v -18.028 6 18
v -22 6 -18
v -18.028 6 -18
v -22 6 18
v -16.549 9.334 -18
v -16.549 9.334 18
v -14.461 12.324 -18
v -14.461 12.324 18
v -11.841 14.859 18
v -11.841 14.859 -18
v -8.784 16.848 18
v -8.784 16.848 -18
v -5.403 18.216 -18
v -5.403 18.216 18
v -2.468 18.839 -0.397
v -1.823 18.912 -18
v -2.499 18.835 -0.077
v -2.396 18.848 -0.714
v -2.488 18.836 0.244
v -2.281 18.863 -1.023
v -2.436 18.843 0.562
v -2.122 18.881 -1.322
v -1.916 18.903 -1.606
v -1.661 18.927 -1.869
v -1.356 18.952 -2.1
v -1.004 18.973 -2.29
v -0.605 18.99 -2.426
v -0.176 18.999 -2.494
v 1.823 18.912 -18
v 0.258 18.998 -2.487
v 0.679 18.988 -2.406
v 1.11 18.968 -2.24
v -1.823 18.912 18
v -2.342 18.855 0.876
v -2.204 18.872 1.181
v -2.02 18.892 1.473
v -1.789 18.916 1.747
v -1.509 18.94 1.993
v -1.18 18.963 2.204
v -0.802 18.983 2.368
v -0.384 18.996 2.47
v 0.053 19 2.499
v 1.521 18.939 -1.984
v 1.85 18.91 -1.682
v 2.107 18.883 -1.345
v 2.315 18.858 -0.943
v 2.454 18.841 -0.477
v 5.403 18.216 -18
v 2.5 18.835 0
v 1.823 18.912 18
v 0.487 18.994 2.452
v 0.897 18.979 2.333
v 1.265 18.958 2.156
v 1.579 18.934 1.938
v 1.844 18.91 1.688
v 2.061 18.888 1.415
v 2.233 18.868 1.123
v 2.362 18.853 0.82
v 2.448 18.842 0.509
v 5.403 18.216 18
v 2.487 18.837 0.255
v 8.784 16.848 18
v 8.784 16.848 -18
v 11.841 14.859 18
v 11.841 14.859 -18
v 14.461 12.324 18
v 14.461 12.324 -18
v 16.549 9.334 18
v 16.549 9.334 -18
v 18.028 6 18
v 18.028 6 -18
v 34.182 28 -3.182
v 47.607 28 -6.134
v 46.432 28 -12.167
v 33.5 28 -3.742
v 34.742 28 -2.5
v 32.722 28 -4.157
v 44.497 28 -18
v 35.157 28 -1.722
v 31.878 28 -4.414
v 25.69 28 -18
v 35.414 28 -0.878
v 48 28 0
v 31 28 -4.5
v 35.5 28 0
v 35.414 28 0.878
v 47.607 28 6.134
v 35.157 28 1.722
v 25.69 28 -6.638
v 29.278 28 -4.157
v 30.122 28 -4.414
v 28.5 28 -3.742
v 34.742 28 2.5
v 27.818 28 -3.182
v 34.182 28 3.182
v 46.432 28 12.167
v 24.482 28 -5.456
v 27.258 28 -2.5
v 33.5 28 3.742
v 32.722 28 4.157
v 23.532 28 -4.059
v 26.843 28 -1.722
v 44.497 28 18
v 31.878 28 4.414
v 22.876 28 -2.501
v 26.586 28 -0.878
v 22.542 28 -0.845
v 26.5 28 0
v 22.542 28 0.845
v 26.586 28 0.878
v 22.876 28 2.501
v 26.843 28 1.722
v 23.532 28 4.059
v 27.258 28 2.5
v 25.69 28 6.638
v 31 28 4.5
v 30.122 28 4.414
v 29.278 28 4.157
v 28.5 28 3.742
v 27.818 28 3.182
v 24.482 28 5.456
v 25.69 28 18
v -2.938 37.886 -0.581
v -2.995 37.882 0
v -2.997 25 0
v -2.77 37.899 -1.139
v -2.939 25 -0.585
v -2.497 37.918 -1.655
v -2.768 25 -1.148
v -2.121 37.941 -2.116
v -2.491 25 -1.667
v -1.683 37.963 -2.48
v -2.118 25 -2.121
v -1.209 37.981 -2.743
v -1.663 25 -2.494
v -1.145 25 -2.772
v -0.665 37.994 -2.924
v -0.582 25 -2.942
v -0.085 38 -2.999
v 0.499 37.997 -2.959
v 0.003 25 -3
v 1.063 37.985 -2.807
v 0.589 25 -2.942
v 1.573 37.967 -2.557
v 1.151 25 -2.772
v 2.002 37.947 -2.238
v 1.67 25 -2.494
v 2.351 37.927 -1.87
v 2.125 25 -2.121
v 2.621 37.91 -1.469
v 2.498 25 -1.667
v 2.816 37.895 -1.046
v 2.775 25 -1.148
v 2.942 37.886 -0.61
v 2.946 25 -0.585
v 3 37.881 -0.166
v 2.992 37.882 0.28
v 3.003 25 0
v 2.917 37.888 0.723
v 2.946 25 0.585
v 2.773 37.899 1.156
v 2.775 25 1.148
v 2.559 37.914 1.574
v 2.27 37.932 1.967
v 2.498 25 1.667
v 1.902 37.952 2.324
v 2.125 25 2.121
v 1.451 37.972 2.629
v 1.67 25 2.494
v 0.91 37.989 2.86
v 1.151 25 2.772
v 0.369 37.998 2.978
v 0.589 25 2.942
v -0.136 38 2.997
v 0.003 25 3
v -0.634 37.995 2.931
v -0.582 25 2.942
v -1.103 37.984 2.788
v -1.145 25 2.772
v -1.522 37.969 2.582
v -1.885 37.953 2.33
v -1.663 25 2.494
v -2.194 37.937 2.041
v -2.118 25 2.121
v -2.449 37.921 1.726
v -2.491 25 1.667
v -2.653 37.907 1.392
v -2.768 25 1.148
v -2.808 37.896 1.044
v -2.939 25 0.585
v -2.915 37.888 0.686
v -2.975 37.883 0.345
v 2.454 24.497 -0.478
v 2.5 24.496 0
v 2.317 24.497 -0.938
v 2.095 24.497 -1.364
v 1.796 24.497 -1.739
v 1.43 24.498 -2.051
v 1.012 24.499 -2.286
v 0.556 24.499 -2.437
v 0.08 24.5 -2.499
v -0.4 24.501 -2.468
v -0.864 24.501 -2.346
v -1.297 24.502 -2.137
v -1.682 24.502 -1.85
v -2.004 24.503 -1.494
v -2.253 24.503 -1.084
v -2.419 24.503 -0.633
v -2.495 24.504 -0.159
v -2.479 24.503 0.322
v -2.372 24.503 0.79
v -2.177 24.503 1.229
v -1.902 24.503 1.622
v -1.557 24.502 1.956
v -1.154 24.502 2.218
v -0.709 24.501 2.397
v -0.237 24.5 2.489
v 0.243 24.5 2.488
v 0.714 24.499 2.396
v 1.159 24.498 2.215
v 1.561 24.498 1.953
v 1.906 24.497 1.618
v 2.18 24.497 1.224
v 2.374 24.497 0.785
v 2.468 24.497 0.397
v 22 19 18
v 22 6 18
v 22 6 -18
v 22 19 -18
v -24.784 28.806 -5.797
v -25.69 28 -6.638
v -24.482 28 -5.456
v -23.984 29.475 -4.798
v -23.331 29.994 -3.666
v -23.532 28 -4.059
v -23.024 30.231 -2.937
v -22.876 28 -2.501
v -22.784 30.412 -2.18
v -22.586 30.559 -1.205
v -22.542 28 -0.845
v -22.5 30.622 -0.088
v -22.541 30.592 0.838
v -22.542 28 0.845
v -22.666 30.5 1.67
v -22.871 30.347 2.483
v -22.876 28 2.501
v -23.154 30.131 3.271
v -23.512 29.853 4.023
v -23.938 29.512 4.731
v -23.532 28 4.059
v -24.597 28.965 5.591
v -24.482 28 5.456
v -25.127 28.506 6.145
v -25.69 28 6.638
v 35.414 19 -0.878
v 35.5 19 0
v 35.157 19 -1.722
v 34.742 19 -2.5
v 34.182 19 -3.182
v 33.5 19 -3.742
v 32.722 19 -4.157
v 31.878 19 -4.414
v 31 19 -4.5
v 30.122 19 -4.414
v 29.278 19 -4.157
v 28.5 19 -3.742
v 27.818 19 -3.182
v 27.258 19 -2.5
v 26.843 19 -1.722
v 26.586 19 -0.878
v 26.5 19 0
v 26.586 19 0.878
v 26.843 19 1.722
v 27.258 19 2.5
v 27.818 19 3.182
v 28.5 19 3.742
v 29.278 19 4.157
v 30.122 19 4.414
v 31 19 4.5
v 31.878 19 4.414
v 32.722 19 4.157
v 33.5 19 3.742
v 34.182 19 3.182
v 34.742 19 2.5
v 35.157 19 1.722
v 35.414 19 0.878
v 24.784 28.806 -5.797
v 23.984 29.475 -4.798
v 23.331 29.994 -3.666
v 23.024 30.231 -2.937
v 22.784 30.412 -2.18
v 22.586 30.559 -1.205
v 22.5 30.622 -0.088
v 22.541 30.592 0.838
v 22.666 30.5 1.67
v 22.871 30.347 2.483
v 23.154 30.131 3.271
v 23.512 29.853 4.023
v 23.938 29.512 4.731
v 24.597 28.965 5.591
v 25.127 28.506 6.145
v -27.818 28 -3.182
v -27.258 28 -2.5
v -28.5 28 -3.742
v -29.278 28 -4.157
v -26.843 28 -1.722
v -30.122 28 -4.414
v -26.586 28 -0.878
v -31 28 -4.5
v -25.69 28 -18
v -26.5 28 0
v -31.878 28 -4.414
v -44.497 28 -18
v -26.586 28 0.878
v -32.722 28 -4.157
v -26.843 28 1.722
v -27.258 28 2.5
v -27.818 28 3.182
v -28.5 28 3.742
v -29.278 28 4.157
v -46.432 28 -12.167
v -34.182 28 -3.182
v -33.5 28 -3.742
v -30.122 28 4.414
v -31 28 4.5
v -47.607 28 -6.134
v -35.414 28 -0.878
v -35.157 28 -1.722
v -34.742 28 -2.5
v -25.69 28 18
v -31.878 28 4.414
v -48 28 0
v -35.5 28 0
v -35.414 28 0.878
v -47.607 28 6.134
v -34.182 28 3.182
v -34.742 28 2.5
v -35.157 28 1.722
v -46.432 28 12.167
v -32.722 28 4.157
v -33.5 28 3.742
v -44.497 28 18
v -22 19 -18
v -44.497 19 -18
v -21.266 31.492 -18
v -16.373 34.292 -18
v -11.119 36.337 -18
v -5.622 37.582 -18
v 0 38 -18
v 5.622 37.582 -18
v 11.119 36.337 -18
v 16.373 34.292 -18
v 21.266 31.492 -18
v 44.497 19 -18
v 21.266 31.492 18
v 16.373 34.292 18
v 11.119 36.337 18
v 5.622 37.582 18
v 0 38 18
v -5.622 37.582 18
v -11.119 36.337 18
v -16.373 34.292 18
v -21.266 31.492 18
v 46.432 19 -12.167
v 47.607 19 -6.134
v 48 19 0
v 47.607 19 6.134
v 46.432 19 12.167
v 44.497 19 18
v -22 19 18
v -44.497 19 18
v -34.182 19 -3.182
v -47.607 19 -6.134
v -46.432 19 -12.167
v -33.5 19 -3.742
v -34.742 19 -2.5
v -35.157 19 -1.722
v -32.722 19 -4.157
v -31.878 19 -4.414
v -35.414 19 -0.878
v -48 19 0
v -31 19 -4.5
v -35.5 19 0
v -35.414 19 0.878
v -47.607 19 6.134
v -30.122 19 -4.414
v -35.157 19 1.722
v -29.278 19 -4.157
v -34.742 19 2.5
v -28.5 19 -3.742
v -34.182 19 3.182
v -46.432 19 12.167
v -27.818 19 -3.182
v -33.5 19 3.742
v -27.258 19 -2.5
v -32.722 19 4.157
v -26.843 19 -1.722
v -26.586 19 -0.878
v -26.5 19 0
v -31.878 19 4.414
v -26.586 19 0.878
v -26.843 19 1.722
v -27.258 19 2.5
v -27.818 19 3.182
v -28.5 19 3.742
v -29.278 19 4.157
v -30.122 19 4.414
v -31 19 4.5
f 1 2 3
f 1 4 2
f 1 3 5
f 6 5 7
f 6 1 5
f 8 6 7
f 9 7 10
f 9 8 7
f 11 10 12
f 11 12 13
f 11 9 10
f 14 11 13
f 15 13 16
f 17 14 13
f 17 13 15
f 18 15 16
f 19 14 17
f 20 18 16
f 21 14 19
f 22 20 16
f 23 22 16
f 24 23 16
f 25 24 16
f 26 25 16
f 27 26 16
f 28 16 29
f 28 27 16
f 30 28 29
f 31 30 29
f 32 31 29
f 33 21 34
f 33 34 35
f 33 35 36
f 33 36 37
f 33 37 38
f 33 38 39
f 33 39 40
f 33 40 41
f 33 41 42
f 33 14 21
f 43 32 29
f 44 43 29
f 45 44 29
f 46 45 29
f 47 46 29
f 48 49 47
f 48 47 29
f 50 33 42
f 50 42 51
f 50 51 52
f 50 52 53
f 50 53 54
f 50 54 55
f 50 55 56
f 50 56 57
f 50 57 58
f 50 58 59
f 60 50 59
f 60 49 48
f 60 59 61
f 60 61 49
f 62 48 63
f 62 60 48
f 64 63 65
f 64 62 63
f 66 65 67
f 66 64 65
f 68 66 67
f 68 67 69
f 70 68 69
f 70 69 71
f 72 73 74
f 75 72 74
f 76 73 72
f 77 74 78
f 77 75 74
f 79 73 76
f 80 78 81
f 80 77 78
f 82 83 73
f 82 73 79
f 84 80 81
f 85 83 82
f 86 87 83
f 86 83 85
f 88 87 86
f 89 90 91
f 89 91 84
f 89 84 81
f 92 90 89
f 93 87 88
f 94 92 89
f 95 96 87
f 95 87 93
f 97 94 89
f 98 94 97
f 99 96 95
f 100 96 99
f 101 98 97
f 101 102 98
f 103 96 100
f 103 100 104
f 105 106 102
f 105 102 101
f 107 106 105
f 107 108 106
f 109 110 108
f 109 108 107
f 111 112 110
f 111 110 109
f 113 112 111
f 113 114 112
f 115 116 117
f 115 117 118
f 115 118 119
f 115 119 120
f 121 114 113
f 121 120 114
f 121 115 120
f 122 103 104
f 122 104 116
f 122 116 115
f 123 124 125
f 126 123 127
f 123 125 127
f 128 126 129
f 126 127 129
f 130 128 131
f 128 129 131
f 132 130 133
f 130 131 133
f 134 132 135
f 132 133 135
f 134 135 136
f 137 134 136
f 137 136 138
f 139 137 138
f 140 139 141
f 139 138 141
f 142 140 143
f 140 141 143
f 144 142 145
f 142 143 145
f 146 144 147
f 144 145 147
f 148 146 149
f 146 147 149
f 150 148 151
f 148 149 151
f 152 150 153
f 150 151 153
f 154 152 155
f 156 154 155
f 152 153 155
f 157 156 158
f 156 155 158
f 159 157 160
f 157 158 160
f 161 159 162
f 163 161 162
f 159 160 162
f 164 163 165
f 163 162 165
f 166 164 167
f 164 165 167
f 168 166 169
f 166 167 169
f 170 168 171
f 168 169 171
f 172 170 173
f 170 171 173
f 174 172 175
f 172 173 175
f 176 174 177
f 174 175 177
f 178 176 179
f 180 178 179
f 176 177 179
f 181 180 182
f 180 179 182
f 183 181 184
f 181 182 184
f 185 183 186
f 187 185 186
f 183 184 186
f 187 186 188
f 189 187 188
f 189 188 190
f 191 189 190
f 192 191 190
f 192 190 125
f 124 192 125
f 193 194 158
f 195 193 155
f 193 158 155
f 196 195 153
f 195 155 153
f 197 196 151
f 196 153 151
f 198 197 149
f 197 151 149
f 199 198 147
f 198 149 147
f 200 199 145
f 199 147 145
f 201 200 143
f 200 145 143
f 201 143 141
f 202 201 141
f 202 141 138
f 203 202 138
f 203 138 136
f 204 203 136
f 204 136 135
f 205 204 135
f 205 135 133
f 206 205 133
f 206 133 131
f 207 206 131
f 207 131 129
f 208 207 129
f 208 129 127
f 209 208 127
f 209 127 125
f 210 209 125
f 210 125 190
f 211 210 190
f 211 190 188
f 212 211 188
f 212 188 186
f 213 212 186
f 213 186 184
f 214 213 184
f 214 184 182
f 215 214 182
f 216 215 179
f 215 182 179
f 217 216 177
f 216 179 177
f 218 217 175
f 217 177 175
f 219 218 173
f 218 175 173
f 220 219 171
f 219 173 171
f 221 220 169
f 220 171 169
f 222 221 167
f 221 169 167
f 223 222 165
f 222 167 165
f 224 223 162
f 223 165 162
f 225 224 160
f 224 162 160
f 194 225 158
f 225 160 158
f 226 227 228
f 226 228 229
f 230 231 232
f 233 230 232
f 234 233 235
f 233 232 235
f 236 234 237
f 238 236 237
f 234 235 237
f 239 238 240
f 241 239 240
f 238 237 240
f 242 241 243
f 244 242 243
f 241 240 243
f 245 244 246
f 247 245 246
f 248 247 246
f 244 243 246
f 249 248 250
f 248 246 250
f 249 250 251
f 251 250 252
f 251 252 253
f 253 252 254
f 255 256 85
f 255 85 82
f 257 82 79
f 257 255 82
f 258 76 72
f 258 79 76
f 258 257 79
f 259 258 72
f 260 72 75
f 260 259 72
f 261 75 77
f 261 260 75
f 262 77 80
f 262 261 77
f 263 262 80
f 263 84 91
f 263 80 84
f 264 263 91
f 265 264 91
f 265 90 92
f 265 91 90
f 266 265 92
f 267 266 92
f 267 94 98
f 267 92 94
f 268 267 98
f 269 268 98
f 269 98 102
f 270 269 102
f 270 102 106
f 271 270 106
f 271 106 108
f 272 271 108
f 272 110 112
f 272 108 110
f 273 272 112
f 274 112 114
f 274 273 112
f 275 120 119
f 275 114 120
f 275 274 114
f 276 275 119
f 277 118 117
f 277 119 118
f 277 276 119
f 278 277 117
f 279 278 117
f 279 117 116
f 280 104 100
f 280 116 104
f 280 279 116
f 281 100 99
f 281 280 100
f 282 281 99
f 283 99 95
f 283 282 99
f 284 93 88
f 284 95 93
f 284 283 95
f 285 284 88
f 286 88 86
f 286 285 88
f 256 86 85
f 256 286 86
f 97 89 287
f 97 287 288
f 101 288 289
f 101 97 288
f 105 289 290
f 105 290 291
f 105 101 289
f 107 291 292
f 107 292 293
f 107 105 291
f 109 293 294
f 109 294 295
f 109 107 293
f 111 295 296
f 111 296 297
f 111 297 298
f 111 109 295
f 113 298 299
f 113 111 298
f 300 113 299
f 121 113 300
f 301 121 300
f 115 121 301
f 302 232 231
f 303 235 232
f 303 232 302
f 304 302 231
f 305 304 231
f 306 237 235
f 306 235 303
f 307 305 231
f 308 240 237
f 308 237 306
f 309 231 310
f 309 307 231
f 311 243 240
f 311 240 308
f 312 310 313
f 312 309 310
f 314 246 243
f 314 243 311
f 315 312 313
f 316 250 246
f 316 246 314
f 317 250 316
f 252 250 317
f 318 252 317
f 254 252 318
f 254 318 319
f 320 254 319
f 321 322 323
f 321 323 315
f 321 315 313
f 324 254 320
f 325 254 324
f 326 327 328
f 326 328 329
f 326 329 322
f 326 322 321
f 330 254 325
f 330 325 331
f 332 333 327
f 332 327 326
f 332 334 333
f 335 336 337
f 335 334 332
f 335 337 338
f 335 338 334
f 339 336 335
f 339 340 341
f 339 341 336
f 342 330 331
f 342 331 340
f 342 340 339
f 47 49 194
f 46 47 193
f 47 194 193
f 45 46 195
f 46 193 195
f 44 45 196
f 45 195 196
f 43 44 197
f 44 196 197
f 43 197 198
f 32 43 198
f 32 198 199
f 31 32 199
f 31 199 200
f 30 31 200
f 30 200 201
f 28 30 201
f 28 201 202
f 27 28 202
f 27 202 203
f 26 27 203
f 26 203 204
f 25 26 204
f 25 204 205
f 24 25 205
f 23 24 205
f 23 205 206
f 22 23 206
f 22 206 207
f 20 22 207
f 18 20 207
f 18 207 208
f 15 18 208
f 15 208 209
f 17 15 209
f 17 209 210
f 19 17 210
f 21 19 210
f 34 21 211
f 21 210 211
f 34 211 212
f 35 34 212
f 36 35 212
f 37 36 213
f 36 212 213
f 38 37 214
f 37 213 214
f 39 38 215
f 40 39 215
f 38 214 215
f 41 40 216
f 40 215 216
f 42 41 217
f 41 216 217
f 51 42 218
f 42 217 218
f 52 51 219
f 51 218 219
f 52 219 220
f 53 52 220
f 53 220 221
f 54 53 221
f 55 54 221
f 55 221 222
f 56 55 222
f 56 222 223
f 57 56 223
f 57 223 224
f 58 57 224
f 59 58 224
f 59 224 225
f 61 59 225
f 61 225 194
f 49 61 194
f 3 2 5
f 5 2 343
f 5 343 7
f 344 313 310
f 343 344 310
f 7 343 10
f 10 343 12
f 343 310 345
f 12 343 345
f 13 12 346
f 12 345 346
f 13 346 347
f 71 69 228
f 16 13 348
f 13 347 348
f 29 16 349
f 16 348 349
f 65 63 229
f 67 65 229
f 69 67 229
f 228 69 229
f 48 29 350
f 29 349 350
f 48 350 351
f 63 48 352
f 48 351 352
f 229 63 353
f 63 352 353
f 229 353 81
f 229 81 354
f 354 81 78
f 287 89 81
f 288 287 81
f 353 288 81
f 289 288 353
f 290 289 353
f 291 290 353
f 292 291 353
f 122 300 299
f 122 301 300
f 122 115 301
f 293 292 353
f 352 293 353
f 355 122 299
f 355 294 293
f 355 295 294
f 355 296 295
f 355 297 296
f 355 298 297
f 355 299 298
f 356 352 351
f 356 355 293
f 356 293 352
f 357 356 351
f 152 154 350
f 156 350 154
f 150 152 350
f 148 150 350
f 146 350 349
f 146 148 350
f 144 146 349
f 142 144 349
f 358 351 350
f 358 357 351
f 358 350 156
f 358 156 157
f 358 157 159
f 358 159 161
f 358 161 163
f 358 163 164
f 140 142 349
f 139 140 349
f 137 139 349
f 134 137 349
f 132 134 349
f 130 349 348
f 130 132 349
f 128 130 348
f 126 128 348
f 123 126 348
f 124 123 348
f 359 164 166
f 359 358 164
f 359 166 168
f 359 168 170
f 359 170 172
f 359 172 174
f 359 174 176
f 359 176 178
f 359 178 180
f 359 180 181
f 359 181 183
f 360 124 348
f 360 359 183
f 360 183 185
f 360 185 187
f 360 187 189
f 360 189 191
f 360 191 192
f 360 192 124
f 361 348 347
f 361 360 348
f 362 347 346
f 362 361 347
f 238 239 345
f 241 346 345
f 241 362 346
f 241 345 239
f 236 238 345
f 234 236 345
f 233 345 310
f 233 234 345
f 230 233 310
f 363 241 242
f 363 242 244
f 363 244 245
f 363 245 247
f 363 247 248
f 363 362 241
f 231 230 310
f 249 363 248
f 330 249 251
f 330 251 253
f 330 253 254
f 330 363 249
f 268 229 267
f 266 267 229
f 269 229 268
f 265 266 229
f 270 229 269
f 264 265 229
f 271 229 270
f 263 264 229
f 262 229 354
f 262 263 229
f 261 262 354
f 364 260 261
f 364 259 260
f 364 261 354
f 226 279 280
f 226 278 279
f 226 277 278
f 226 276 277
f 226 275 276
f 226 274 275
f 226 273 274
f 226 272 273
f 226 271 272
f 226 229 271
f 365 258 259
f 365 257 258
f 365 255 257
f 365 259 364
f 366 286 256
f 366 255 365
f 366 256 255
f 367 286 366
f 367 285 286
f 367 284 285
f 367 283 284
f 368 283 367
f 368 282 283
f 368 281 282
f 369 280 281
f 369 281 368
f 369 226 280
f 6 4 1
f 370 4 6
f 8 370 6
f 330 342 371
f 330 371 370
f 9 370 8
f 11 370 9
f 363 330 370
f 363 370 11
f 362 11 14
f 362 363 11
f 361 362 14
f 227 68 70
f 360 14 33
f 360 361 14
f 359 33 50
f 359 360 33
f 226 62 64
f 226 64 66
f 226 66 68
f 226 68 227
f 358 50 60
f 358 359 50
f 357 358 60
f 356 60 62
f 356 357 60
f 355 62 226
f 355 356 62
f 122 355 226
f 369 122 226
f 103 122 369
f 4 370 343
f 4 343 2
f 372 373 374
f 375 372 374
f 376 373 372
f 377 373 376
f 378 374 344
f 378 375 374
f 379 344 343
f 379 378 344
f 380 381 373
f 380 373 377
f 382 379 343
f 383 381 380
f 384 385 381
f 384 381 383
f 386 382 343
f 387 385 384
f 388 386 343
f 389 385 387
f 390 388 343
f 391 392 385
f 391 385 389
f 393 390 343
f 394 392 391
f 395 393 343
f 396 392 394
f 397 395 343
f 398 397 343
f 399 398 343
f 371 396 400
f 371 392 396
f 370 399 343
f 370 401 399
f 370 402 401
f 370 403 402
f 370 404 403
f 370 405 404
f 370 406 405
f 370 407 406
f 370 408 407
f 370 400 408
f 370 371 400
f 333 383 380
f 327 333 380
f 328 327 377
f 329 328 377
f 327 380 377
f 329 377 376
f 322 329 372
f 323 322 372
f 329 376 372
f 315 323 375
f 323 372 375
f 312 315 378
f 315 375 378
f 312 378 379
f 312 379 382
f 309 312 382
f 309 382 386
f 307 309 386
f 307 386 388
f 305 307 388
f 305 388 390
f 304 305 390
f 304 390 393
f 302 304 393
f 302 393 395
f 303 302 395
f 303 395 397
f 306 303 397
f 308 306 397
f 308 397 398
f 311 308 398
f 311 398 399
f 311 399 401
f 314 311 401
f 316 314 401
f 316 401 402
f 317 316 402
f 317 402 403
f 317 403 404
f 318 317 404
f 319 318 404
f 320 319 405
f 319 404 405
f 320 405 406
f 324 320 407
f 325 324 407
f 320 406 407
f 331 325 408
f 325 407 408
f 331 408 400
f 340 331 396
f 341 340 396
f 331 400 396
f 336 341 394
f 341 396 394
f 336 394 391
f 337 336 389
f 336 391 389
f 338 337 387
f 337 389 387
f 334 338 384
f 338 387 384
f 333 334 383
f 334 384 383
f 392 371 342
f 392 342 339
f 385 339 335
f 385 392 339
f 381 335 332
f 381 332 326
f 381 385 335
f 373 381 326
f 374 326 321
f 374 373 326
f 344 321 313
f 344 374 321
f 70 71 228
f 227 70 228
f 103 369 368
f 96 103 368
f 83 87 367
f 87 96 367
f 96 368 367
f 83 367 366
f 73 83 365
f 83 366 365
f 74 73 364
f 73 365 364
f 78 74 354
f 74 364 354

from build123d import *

# Parameters (mm, degrees)
BOSS_EXTRUDE1_DEPTH                 = 18
F_6_0MM_DOWEL_HOLE1_D               = 9
CUT_EXTRUDE2_DEPTH                  = 10
F_6_0MM_DOWEL_HOLE2_D               = 6
F_6_0MM_DOWEL_HOLE2_DEPTH           = 13
F_6_0MM_DOWEL_HOLE2_TIP             = 3
F_6_0MM_DOWEL_HOLE2_ON_FACE_2_D     = 6
F_6_0MM_DOWEL_HOLE2_ON_FACE_2_DEPTH = 13
F_6_0MM_DOWEL_HOLE2_ON_FACE_2_TIP   = 3
F_5_0MM_DOWEL_HOLE2_D               = 5
CUT_EXTRUDE3_START                  = -23.0000001
CUT_EXTRUDE3_DEPTH                  = 34.000000209


with BuildPart() as part:
    # Sketch1 → Boss-Extrude1 (new body, symmetric)
    with BuildSketch(Plane.XY):
        with BuildLine():
            Line((18.027756377, 6), (22, 6))
            Line((22, 6), (22, 19))
            Line((22, 19), (50, 19))
            Line((50, 19), (50, 28))
            Line((50, 28), (25.690465157, 28))
            ThreePointArc((25.690465157, 28), (0, 38), (-25.690465157, 28))
            Line((-25.690465157, 28), (-50, 28))
            Line((-50, 28), (-50, 19))
            Line((-50, 19), (-22, 19))
            Line((-22, 19), (-22, 6))
            Line((-22, 6), (-18.027756377, 6))
            ThreePointArc((-18.027756377, 6), (0, 19), (18.027756377, 6))
        make_face()
    extrude(amount=BOSS_EXTRUDE1_DEPTH, both=True)

    # Ø6.0mm Dowel Hole1 (through all)
    with Locations(Plane(origin=(0, 28, 0), x_dir=(1, 0, 0), z_dir=(0, 1, 0))):
        with Locations((-31, 0)):
            f_6_0mm_dowel_hole1 = Hole(F_6_0MM_DOWEL_HOLE1_D / 2)

    # Mirror1: Ø6.0mm Dowel Hole1 across plane
    add(f_6_0mm_dowel_hole1.mirror(Plane(origin=(0, 0, 0), x_dir=(0, 0, 1), z_dir=(1, 0, 0))), mode=Mode.SUBTRACT)

    # Sketch6 → Cut-Extrude2 (cut)
    with BuildSketch(Plane(origin=(0, 28, 0), x_dir=(1, 0, 0), z_dir=(0, 1, 0))):
        with BuildLine():
            Line((-25.690465157, -6.637683312), (-25.690465157, 6.637683312))
            ThreePointArc((-25.690465157, 6.637683312), (-22.5, 0), (-25.690465157, -6.637683312))
        make_face()
    cut_extrude2 = extrude(amount=CUT_EXTRUDE2_DEPTH, mode=Mode.SUBTRACT)

    # Mirror3: Cut-Extrude2 across plane
    add(cut_extrude2.mirror(Plane(origin=(0, 0, 0), x_dir=(0, 0, 1), z_dir=(1, 0, 0))), mode=Mode.SUBTRACT)

    # Ø6.0mm Dowel Hole2
    with Locations(Plane(origin=(0.004931503, 37.99999968, 0), x_dir=(0.999999992, -0.000129776, 0), z_dir=(0.000129776, 0.999999992, 0))):
        with Locations((0, 0)):
            Hole(F_6_0MM_DOWEL_HOLE2_D / 2, depth=F_6_0MM_DOWEL_HOLE2_DEPTH)
            with Locations((0, 0, -(F_6_0MM_DOWEL_HOLE2_DEPTH + F_6_0MM_DOWEL_HOLE2_TIP / 2))):  # 90° drill point
                Cone(0, F_6_0MM_DOWEL_HOLE2_D / 2, F_6_0MM_DOWEL_HOLE2_TIP, mode=Mode.SUBTRACT)

    # Ø6.0mm Dowel Hole2 on face 2
    with Locations(Plane(origin=(0, 0, 0), x_dir=(0.999999992, -0.000129776, 0), z_dir=(0.000129776, 0.999999992, 0))):
        with Locations((0, 0)):
            Hole(F_6_0MM_DOWEL_HOLE2_ON_FACE_2_D / 2, depth=F_6_0MM_DOWEL_HOLE2_ON_FACE_2_DEPTH)
            with Locations((0, 0, -(F_6_0MM_DOWEL_HOLE2_ON_FACE_2_DEPTH + F_6_0MM_DOWEL_HOLE2_ON_FACE_2_TIP / 2))):  # 90° drill point
                Cone(0, F_6_0MM_DOWEL_HOLE2_ON_FACE_2_D / 2, F_6_0MM_DOWEL_HOLE2_ON_FACE_2_TIP, mode=Mode.SUBTRACT)

    # Ø5.0mm Dowel Hole2 (through all)
    with Locations(Plane(origin=(-1.0606e-05, 19, 0), x_dir=(-1, -5.58e-07, 0), z_dir=(5.58e-07, -1, 0))):
        with Locations((0, 0)):
            Hole(F_5_0MM_DOWEL_HOLE2_D / 2)

    # Sketch12 → Cut-Extrude3 (cut)
    with BuildSketch(Plane(origin=(0, 28, 0), x_dir=(1, 0, 0), z_dir=(0, 1, 0)).offset(CUT_EXTRUDE3_START)):
        with BuildLine():
            Line((35.09453238, -214.75600598), (-44.497190923, -18))
            ThreePointArc((-44.497190923, -18), (-48, 0), (-44.497190923, 18))
            Line((-44.497190923, 18), (35.09453238, 214.75600598))
            Line((35.09453238, 214.75600598), (-389.394658565, 214.75600598))
            Line((-389.394658565, 214.75600598), (-389.394658565, -214.75600598))
            Line((-389.394658565, -214.75600598), (35.09453238, -214.75600598))
        make_face()
    cut_extrude3 = extrude(amount=CUT_EXTRUDE3_DEPTH, mode=Mode.SUBTRACT)

    # Mirror4: Cut-Extrude3 across plane
    add(cut_extrude3.mirror(Plane(origin=(0, 0, 0), x_dir=(0, 0, 1), z_dir=(1, 0, 0))), mode=Mode.SUBTRACT)


solid = part.part
